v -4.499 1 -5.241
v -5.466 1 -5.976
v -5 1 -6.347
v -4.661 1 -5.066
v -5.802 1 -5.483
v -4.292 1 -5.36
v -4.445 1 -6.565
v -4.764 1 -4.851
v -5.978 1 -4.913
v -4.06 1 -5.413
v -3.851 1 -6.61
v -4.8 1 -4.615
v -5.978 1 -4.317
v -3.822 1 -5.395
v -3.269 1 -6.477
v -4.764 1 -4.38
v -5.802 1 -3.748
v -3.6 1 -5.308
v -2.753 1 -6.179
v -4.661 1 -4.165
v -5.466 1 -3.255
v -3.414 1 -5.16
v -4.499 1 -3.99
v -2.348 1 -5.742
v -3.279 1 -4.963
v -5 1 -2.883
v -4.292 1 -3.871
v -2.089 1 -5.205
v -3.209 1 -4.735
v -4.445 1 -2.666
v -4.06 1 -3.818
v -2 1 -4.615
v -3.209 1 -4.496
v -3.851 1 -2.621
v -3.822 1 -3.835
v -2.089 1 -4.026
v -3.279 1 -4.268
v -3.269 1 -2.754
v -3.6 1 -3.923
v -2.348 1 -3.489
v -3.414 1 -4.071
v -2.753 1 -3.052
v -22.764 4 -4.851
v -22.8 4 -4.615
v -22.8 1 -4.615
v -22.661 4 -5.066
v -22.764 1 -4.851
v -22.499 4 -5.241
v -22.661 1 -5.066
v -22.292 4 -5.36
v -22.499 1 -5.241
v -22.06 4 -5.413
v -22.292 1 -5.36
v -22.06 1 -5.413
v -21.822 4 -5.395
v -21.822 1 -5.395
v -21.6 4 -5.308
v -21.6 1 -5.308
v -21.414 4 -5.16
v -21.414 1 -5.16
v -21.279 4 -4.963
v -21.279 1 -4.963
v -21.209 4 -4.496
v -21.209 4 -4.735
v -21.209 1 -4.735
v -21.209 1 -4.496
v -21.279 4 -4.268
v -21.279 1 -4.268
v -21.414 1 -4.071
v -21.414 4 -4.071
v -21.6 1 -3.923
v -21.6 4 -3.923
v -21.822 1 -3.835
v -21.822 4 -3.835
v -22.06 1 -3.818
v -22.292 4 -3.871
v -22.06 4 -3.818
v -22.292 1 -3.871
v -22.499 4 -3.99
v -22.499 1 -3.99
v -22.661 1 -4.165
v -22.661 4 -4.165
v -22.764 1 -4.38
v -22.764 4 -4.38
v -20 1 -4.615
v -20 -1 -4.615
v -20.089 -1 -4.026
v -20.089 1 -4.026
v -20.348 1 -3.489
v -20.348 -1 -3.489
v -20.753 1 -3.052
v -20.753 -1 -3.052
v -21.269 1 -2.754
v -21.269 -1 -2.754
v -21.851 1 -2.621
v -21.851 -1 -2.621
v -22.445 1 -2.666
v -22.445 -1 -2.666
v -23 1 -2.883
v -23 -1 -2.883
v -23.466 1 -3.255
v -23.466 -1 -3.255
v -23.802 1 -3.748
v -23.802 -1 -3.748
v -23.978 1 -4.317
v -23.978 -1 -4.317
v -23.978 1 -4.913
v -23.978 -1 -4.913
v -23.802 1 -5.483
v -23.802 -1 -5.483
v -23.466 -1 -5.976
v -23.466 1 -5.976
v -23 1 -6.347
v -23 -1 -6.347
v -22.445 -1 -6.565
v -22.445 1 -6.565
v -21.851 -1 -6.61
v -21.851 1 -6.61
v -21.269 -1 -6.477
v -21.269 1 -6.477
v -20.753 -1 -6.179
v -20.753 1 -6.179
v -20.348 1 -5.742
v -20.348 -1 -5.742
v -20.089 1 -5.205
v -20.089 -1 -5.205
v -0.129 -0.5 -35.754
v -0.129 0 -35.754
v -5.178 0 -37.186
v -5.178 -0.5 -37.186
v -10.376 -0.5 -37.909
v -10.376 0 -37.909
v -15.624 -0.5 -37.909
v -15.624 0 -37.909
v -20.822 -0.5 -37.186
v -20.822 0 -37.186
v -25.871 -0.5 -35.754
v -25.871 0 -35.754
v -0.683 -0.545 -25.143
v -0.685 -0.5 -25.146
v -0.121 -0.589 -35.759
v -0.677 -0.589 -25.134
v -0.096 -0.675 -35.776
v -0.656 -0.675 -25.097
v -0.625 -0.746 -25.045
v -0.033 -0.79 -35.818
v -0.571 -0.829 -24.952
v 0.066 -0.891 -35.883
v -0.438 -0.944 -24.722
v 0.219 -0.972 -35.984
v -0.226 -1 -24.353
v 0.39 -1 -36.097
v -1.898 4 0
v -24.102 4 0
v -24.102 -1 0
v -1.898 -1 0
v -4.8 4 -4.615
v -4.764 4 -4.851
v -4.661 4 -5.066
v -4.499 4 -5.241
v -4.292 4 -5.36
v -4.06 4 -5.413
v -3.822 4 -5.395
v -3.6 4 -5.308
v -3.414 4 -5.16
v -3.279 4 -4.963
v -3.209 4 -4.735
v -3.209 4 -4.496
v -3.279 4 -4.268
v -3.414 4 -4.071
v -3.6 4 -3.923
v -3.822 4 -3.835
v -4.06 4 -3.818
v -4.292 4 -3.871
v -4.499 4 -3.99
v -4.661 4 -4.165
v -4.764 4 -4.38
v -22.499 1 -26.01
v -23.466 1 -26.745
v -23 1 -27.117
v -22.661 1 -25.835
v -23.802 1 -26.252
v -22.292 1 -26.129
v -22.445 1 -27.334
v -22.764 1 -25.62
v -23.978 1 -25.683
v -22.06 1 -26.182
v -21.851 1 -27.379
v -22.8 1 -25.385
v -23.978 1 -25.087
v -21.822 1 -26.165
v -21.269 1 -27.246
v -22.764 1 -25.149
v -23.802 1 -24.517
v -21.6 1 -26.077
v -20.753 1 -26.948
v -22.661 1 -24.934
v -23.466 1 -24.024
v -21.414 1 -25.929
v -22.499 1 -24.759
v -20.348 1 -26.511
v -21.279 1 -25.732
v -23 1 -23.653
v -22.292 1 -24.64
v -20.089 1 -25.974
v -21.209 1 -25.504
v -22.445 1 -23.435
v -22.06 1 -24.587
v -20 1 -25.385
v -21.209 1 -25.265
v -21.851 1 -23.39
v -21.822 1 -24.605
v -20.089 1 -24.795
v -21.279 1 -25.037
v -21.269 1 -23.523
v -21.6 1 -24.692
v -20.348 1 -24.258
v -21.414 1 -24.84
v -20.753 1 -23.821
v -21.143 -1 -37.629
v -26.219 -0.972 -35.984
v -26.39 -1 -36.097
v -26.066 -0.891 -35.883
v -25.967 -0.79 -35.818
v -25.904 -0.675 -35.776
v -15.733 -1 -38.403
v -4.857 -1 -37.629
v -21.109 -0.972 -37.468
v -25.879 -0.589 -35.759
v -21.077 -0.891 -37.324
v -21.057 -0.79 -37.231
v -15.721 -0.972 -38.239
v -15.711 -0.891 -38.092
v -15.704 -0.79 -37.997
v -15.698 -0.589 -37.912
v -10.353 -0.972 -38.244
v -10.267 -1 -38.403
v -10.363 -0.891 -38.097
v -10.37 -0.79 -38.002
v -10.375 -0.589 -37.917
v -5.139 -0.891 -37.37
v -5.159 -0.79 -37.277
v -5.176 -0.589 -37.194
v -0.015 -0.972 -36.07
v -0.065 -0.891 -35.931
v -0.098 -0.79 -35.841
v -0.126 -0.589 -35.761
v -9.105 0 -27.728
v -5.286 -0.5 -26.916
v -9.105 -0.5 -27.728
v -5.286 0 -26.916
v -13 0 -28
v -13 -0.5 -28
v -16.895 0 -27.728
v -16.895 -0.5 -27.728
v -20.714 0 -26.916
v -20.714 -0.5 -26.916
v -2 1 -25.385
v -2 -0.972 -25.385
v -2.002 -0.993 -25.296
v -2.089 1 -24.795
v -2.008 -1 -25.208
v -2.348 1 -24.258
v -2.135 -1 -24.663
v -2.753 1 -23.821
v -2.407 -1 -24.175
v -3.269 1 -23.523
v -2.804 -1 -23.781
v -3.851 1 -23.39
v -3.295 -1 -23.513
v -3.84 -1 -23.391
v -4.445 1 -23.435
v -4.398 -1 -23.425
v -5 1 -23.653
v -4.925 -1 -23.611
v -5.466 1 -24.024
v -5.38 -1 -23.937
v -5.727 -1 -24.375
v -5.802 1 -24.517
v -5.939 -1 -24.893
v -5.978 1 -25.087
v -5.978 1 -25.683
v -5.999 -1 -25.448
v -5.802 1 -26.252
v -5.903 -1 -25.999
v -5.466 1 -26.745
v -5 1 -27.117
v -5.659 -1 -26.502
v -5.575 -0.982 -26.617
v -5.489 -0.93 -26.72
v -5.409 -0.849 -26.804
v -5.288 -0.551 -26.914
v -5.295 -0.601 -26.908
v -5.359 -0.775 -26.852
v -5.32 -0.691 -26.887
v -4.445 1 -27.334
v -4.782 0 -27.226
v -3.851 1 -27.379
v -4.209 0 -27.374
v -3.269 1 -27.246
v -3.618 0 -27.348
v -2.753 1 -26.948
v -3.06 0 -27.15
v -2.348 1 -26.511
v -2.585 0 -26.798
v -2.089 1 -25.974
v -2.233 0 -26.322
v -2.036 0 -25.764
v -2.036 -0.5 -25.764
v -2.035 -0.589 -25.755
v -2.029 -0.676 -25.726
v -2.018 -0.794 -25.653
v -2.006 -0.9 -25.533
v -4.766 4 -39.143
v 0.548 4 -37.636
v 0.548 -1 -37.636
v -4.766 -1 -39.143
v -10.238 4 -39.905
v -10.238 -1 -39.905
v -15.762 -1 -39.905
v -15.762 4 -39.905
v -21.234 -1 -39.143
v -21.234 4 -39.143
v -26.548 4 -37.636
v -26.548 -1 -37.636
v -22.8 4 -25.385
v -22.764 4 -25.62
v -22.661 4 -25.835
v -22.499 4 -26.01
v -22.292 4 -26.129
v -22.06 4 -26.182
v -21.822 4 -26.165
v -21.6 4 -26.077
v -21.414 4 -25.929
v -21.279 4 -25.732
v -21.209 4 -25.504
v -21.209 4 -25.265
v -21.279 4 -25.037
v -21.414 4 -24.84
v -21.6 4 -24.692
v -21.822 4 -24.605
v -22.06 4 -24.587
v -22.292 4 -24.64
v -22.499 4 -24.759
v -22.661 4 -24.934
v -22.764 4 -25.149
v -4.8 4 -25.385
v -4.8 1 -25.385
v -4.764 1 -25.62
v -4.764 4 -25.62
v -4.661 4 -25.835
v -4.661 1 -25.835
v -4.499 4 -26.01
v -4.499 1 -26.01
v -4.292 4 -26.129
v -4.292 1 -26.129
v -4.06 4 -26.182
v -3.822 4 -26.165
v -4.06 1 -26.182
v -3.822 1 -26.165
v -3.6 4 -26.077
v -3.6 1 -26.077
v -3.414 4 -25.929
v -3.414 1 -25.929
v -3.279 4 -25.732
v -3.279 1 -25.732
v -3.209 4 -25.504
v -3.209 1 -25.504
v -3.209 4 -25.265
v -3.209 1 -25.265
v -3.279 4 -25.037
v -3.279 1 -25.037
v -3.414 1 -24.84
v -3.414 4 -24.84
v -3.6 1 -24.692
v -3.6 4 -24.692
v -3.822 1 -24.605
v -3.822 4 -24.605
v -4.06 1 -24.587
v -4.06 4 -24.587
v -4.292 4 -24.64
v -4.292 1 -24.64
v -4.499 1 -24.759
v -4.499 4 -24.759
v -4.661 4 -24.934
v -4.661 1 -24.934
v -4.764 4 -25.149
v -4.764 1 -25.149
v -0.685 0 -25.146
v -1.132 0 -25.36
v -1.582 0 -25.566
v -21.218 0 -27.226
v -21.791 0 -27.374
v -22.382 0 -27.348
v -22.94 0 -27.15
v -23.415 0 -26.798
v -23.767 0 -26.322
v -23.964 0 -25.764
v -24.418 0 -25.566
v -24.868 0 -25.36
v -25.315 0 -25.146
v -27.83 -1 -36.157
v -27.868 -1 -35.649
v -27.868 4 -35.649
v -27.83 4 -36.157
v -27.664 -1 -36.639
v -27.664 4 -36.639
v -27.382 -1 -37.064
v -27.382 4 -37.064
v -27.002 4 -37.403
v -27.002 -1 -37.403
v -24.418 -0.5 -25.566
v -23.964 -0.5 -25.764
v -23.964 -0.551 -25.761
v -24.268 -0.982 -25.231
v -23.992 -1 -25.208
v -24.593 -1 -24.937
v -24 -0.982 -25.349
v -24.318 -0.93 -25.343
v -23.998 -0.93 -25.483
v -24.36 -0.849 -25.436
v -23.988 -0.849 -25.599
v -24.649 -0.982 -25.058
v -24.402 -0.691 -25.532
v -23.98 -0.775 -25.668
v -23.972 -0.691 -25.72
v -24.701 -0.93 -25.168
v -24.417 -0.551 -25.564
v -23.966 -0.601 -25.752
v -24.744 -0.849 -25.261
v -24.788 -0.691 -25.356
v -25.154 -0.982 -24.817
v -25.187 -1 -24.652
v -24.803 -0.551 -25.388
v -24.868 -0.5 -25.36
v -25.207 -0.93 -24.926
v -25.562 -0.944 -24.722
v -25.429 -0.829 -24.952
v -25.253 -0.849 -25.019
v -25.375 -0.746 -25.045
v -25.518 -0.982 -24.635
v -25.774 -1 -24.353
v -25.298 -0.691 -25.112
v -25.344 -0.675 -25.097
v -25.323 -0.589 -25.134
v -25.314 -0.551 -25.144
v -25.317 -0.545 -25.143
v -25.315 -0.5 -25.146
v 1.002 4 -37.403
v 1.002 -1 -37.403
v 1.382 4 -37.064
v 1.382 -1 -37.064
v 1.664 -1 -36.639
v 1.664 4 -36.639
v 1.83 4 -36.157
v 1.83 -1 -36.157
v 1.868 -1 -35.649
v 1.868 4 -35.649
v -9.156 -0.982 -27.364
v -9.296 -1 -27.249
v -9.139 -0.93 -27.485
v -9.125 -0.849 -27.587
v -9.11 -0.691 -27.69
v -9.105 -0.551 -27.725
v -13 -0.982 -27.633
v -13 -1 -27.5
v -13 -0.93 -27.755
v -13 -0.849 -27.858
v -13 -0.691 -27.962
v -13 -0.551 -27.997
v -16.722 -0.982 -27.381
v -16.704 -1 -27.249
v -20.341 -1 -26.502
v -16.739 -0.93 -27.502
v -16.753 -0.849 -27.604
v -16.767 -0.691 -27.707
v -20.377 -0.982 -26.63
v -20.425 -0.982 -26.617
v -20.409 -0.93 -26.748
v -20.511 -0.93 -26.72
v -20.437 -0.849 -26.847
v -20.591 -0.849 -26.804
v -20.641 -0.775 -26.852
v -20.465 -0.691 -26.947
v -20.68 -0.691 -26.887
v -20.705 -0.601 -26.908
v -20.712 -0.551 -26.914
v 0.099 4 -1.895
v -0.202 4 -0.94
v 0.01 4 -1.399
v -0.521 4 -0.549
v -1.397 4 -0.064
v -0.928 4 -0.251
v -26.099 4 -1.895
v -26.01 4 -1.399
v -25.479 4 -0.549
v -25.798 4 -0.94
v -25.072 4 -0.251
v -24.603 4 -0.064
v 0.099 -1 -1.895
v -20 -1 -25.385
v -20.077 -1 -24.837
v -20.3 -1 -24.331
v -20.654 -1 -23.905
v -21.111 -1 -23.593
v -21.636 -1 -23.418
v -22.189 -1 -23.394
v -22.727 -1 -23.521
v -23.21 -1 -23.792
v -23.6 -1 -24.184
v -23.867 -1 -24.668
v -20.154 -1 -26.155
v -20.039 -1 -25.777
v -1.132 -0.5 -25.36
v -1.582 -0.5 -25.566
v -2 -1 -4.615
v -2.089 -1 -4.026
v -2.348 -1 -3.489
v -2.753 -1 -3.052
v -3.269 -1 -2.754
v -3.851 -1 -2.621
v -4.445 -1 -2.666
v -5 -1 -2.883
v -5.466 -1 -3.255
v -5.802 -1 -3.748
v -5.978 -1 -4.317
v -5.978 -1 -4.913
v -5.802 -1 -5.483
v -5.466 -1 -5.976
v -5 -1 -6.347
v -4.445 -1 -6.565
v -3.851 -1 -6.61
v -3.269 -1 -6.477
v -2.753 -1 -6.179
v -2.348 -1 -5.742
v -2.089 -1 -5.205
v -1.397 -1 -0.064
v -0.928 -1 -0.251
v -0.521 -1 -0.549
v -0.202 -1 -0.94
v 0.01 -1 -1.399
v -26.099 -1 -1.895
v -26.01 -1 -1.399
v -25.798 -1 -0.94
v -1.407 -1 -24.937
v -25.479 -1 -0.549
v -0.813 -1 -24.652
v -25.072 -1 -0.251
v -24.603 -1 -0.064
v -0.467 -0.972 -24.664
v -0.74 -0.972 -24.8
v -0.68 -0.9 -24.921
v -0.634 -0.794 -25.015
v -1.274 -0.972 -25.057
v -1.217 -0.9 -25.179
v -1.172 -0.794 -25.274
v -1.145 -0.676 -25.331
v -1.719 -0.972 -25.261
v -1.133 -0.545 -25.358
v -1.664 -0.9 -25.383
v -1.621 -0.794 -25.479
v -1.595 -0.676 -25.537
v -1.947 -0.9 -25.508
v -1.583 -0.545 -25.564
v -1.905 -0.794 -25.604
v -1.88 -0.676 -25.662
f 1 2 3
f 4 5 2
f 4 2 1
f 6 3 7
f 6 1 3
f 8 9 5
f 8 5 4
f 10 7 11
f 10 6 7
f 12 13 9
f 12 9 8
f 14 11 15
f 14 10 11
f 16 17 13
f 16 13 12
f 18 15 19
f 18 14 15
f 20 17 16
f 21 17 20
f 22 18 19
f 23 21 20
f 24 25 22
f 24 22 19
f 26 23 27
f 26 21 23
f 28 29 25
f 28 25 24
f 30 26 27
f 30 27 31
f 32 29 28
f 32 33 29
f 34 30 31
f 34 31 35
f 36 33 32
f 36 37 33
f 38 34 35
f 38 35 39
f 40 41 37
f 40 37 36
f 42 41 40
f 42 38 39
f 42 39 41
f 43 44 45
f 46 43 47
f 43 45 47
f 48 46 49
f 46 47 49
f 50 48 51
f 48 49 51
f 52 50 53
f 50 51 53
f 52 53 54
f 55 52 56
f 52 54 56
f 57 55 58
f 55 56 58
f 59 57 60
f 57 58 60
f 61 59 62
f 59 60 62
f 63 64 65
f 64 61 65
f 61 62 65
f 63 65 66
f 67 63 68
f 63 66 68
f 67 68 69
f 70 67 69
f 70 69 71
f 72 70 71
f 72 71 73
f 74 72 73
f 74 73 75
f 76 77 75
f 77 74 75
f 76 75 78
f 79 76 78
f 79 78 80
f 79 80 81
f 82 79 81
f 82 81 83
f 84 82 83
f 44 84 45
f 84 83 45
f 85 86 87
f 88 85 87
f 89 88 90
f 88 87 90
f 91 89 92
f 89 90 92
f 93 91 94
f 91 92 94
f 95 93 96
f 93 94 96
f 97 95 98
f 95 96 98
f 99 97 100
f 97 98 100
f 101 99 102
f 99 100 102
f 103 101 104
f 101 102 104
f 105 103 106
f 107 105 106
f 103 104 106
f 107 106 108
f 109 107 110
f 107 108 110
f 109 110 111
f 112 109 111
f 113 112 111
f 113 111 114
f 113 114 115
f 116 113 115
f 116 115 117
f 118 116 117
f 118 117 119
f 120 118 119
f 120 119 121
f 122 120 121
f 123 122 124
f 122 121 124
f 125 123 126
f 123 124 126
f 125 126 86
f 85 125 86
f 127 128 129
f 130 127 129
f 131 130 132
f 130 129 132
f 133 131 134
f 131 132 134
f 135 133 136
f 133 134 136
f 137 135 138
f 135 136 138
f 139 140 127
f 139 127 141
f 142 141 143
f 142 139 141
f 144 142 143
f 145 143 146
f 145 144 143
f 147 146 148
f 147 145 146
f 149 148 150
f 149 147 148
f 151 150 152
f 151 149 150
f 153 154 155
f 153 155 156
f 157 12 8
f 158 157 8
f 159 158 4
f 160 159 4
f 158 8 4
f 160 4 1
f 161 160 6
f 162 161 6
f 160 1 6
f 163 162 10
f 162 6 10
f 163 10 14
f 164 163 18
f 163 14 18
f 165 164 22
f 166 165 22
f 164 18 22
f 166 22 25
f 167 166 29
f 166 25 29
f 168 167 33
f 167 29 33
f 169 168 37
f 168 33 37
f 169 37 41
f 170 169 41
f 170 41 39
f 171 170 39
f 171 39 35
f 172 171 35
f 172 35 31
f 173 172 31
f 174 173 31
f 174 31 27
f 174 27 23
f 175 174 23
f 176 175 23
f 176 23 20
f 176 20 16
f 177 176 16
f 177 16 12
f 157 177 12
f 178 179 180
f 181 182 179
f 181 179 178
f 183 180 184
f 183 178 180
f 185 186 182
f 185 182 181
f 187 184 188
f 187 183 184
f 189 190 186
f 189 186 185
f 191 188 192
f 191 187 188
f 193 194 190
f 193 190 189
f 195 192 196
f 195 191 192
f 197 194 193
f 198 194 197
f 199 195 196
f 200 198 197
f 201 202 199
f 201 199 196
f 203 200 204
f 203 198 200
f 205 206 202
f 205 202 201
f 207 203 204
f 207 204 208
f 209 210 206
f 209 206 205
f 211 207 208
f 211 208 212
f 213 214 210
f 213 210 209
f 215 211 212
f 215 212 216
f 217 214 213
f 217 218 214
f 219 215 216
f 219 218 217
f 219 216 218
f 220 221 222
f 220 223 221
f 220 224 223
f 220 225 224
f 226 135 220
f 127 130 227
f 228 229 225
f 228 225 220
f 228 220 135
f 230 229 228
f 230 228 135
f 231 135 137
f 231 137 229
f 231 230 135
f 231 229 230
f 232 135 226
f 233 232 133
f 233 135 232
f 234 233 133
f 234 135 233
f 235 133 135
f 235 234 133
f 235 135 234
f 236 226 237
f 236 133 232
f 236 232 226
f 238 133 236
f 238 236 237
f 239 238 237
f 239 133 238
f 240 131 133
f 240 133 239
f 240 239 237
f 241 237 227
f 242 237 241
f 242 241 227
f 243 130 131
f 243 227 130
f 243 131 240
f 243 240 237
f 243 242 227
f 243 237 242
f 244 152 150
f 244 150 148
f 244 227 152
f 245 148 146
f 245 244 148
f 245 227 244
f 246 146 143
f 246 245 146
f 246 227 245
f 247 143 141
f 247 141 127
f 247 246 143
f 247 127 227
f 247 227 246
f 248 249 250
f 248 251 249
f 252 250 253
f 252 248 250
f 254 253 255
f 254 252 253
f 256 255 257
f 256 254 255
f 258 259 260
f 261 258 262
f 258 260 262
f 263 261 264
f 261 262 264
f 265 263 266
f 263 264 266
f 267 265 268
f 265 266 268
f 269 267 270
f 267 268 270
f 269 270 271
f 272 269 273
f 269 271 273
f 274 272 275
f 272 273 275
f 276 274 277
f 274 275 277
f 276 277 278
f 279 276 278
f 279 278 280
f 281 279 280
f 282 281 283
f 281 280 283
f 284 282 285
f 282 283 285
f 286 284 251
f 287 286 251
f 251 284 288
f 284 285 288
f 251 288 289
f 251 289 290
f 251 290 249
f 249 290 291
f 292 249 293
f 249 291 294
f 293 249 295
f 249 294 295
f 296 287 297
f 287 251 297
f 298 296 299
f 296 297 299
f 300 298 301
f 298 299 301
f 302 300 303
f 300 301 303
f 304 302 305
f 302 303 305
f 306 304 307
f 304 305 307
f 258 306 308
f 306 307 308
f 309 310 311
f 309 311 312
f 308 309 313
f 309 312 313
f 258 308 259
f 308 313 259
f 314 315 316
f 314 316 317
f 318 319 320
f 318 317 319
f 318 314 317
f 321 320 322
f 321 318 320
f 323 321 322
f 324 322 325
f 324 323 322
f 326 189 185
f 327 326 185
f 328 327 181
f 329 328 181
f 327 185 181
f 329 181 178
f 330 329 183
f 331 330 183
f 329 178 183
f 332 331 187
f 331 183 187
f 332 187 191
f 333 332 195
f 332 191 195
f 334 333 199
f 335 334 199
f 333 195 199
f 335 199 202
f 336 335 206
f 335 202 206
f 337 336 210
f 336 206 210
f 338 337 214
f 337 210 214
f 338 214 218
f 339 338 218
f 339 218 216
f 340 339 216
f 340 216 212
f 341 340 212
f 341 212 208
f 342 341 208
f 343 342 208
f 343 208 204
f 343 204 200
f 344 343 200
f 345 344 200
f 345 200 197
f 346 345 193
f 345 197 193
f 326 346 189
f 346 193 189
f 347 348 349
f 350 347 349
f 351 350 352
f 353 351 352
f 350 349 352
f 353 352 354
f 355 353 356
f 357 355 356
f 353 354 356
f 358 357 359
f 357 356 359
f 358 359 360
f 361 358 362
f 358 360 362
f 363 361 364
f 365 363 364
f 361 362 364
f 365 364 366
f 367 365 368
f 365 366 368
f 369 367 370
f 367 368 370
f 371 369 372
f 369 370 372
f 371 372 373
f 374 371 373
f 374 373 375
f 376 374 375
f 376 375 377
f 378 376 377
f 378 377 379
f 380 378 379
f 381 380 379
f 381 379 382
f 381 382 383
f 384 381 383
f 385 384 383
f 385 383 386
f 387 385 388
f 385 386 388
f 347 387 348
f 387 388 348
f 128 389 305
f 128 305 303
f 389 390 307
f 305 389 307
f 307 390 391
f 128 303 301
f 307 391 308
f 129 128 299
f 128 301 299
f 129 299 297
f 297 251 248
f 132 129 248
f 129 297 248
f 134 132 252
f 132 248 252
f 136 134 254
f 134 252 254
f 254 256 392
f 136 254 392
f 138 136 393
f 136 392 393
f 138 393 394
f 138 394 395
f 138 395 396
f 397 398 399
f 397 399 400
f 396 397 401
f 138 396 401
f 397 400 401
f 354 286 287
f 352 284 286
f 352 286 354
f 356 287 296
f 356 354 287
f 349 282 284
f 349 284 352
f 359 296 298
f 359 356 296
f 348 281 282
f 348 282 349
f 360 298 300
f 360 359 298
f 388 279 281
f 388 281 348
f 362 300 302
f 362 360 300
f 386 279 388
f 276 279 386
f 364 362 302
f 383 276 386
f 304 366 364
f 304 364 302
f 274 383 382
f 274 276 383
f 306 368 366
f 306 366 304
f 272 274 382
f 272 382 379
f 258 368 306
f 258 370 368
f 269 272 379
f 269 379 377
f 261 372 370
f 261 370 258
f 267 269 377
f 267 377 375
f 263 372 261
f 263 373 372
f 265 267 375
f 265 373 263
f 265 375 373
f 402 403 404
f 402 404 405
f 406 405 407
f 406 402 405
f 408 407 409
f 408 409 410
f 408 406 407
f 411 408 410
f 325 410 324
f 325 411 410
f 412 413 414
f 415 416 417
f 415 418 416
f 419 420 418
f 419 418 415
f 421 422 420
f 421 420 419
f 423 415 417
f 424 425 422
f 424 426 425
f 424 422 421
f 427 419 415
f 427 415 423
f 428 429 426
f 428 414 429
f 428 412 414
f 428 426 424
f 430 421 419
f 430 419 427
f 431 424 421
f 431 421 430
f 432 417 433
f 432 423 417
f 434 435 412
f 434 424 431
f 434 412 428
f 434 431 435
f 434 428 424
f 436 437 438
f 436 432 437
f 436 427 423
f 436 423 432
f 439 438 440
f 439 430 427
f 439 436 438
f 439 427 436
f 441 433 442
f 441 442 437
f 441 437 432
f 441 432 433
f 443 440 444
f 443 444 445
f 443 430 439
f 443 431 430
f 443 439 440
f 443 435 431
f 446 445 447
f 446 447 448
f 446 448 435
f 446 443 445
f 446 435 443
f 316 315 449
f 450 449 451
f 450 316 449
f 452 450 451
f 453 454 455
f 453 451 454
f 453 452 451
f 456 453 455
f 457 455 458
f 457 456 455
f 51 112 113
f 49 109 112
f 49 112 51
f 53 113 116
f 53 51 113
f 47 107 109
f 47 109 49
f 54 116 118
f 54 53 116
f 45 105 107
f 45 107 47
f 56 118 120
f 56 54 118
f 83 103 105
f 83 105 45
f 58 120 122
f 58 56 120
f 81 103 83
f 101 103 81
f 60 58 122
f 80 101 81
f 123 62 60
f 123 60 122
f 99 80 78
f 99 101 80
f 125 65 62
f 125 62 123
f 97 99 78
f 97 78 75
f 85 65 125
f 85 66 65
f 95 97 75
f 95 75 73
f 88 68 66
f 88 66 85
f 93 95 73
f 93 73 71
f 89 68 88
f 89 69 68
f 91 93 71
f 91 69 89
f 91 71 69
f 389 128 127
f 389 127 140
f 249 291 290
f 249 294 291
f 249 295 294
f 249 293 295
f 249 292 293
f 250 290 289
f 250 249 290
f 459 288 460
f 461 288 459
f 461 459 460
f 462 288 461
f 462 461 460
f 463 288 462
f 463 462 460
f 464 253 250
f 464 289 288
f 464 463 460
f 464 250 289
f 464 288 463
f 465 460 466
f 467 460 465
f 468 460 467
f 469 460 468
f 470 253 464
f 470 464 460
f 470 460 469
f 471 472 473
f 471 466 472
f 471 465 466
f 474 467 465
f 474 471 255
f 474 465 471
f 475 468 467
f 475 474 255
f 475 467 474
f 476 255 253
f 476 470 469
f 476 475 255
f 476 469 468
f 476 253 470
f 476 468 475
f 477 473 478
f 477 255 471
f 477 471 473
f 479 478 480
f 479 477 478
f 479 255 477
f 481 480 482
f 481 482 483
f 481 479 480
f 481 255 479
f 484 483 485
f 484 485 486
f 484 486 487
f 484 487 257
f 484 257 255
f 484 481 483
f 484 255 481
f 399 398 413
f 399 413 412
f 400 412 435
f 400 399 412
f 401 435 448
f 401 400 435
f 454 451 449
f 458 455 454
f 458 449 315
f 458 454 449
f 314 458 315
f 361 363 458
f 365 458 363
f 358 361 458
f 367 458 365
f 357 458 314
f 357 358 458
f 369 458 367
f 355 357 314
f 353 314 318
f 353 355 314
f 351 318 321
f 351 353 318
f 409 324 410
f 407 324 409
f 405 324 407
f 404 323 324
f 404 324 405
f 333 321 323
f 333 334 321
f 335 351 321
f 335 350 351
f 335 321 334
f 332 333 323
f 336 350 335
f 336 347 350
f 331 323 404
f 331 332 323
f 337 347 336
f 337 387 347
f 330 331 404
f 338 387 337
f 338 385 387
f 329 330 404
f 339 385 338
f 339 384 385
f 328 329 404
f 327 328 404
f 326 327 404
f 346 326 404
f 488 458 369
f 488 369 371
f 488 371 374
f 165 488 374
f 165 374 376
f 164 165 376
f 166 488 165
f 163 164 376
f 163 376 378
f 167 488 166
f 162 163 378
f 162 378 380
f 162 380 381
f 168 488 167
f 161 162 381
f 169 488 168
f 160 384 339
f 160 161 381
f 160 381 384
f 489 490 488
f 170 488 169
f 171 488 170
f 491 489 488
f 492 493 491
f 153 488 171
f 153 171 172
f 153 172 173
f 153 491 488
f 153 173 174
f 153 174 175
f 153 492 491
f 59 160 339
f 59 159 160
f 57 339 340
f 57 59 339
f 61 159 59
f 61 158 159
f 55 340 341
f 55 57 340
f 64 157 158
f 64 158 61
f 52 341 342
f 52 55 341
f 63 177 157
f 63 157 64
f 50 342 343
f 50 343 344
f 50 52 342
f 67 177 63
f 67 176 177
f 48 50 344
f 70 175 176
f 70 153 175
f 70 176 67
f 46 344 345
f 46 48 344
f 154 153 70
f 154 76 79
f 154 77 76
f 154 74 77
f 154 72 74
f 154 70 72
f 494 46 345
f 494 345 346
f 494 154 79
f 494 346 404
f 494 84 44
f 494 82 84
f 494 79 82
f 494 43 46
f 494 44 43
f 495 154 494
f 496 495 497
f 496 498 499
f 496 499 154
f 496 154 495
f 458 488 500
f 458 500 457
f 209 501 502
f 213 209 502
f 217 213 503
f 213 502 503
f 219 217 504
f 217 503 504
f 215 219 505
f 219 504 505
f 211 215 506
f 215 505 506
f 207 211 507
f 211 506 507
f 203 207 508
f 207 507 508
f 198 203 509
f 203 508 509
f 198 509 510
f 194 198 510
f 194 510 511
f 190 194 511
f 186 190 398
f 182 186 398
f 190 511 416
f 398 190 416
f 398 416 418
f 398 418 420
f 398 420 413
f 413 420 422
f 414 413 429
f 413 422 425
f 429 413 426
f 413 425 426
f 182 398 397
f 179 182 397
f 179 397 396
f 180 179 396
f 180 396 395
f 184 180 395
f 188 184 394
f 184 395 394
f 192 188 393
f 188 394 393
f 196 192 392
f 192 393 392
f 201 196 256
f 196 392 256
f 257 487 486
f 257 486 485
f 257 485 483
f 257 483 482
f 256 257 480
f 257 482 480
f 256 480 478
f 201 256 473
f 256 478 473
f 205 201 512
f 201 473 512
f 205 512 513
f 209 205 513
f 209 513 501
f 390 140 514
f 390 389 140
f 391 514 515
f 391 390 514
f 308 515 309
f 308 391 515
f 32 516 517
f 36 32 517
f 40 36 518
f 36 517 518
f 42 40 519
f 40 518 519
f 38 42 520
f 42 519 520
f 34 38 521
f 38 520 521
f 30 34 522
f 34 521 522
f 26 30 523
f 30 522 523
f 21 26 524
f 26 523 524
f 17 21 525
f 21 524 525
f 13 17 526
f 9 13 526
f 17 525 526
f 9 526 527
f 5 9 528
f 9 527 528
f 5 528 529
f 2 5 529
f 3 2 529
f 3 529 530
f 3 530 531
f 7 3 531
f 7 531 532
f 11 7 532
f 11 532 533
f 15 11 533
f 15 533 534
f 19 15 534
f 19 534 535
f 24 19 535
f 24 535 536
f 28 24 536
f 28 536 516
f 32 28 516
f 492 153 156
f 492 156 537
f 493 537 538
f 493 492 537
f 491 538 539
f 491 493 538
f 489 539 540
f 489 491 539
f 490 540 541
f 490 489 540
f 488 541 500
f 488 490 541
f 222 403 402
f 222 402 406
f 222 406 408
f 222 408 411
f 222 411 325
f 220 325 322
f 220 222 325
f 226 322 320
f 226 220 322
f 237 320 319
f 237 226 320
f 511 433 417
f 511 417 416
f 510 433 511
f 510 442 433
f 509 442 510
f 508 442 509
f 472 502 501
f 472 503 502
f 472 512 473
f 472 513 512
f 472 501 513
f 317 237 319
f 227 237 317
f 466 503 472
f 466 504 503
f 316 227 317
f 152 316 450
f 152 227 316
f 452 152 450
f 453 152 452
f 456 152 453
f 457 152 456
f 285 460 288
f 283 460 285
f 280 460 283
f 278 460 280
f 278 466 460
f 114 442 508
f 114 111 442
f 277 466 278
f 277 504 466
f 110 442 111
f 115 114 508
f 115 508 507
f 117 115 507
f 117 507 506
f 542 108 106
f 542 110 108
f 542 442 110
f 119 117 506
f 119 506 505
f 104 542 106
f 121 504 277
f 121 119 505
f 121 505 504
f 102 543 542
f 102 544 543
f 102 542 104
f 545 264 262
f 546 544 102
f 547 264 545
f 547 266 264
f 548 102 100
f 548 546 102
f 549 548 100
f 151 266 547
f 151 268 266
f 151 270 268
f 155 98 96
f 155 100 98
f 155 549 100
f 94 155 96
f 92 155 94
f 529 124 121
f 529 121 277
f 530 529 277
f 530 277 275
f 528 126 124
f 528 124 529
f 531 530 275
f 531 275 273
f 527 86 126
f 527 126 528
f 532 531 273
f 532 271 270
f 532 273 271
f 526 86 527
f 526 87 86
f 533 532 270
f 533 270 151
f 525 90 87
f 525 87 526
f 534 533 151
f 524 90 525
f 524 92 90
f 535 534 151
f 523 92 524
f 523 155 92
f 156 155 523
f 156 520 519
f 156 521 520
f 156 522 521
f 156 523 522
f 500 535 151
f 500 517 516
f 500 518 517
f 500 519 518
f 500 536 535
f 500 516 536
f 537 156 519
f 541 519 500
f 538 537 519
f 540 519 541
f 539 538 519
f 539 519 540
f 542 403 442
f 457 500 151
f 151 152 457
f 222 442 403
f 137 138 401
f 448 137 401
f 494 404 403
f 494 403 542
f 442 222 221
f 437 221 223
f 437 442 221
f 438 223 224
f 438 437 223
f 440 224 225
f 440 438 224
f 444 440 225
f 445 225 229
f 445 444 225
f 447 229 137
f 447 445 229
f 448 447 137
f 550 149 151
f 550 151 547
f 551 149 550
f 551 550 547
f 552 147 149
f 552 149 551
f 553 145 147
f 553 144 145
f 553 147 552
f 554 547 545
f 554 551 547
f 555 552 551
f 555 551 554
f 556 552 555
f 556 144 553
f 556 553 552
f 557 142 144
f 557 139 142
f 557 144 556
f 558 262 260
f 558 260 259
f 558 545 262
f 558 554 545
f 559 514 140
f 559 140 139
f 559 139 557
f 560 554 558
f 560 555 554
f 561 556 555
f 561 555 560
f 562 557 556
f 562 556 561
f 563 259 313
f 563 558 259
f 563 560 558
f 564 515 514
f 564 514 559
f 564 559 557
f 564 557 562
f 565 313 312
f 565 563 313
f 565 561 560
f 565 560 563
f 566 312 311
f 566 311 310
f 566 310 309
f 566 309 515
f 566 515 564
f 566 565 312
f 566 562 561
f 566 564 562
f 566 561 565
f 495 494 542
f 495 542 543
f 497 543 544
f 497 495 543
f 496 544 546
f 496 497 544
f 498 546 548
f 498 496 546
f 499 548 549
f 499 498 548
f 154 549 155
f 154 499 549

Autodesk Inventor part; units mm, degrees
ref_plane "YZ Plane" through (0, 0, 0) normal (1, 0, 0) x (0, 1, 0)
ref_plane "XZ Plane" through (0, 0, 0) normal (0, 1, 0) x (-1, 0, 0)
ref_plane "XY Plane" through (0, 0, 0) normal (0, 0, 1) x (1, 0, 0)
sketch "スケッチ1" plane through (0, 0, 0) normal (0, 1, 0) x (-1, 0, 0)
  line L0 (26, 0) -> (0, 0)
  line L1 (0, 0) -> (0, -30)
  line L2 (0, -30) -> (26, -30)
  line L3 (26, -30) -> (26, 0)
  line L4 (26, 0) -> (27.9445, -37.1034)
  line L5 (0, 0) -> (-1.9445, -37.1034)
  arc A0 (-1.9445, -37.1034) -> (27.9445, -37.1034) centre (13, 0) ccw
  line L6 (0, 0) -> (26, -30)
  line L7 (0, -30) -> (26, 0)
  line L8 (4, -4.6154) -> (22, -4.6154)
  line L9 (22, -4.6154) -> (22, -25.3846)
  line L10 (22, -25.3846) -> (4, -25.3846)
  line L11 (4, -25.3846) -> (4, -4.6154)
  circle A1 centre (4, -4.6154) radius 0.8
  circle A2 centre (4, -25.3846) radius 0.8
  circle A3 centre (22, -4.6154) radius 0.8
  circle A4 centre (22, -25.3846) radius 0.8
  dimension "d0" = 26
  dimension "d3" = 30
  dimension "d4" = 3
  dimension "d5" = 3
  dimension "d6" = 40
  dimension "d17" = 4
  dimension "d18" = 1.6
  dimension "d19" = 1.6
  dimension "d20" = 1.6
  dimension "d21" = 1.6
extrude "押し出し1" add sketch "スケッチ1" along normal blind 4 contours L7 A3 L8 A1 L6 L0 | L4 A0 L5 L1 L2 L3 | L3 L6 A4 L9 A3 L7 | L6 A1 L11 A2 L7 L1 | L2 L7 A2 L10 A4 L6 | A3 L7 L6 A1 L8 | A1 L6 L7 A2 L11 | L10 A2 L7 L6 A4 | A3 L9 A4 L6 L7
sketch "スケッチ2" plane through (0, 0, 0) normal (0, -1, 0) x (1, 0, 0)
  arc A0 (-25.871, -35.7538) -> (-0.129, -35.7538) centre (-13, 0) ccw
  arc A1 (-27.9445, -37.1034) -> (1.9445, -37.1034) centre (-13, 0) ccw projected
  line L0 (-0.129, -35.7538) -> (-0.6849, -25.1463)
  line L1 (-25.871, -35.7538) -> (-25.3151, -25.1463)
  arc A2 (-25.3151, -25.1463) -> (-0.6849, -25.1463) centre (-13, 0) ccw
  line L2 (0, 0) -> (1.9445, -37.1034) projected
  line L3 (-27.9445, -37.1034) -> (-26, 0) projected
  line L4 (-26, 0) -> (0, 0) projected
  circle A3 centre (-4, -4.6154) radius 0.8 projected
  circle A4 centre (-22, -4.6154) radius 0.8 projected
  circle A5 centre (-22, -25.3846) radius 0.8 projected
  circle A6 centre (-4, -25.3846) radius 0.8 projected
  dimension "d9" = 2
  dimension "d10" = 2
  dimension "d11" = 2
  dimension "d12" = 10
extrude "押し出し3" add sketch "スケッチ2" along normal blind 1
fillet "フィレット1" radius 0.5 4 edges at (-13, -1, -28) (-0.4069, -1, -30.4501) (-13, -1, -38) (-25.5931, -1, -30.4501)
fillet "フィレット2" radius 2 4 edges at (-27.9445, 1.5, -37.1034) (1.9445, 1.5, -37.1034) (0, 1.5, 0) (-26, 1.5, 0)
sketch "スケッチ3" plane through (0, -1, 0) normal (0, -1, 0) x (1, 0, 0)
  circle A0 centre (-4, -4.6154) radius 0.8 projected
  circle A1 centre (-22, -4.6154) radius 0.8 projected
  arc A2 (-21.6502, -26.1041) -> (-22.7249, -25.7231) centre (-22, -25.3846) ccw projected
  arc A3 (-3.2751, -25.7231) -> (-4.3498, -26.1041) centre (-4, -25.3846) ccw projected
  circle A4 centre (-4, -4.6154) radius 2
  circle A5 centre (-22, -4.6154) radius 2
  circle A6 centre (-22, -25.3846) radius 2
  circle A7 centre (-4, -25.3846) radius 2
  point P0 (0, 0)
  dimension "d22" = 4
  dimension "d23" = 4
  dimension "d24" = 4
  dimension "d25" = 4
extrude "押し出し4" cut sketch "スケッチ3" against normal blind 2 contours A0 | A1 | A4 | A5 | A6 | A7
properties part number "toe_sole_back"
